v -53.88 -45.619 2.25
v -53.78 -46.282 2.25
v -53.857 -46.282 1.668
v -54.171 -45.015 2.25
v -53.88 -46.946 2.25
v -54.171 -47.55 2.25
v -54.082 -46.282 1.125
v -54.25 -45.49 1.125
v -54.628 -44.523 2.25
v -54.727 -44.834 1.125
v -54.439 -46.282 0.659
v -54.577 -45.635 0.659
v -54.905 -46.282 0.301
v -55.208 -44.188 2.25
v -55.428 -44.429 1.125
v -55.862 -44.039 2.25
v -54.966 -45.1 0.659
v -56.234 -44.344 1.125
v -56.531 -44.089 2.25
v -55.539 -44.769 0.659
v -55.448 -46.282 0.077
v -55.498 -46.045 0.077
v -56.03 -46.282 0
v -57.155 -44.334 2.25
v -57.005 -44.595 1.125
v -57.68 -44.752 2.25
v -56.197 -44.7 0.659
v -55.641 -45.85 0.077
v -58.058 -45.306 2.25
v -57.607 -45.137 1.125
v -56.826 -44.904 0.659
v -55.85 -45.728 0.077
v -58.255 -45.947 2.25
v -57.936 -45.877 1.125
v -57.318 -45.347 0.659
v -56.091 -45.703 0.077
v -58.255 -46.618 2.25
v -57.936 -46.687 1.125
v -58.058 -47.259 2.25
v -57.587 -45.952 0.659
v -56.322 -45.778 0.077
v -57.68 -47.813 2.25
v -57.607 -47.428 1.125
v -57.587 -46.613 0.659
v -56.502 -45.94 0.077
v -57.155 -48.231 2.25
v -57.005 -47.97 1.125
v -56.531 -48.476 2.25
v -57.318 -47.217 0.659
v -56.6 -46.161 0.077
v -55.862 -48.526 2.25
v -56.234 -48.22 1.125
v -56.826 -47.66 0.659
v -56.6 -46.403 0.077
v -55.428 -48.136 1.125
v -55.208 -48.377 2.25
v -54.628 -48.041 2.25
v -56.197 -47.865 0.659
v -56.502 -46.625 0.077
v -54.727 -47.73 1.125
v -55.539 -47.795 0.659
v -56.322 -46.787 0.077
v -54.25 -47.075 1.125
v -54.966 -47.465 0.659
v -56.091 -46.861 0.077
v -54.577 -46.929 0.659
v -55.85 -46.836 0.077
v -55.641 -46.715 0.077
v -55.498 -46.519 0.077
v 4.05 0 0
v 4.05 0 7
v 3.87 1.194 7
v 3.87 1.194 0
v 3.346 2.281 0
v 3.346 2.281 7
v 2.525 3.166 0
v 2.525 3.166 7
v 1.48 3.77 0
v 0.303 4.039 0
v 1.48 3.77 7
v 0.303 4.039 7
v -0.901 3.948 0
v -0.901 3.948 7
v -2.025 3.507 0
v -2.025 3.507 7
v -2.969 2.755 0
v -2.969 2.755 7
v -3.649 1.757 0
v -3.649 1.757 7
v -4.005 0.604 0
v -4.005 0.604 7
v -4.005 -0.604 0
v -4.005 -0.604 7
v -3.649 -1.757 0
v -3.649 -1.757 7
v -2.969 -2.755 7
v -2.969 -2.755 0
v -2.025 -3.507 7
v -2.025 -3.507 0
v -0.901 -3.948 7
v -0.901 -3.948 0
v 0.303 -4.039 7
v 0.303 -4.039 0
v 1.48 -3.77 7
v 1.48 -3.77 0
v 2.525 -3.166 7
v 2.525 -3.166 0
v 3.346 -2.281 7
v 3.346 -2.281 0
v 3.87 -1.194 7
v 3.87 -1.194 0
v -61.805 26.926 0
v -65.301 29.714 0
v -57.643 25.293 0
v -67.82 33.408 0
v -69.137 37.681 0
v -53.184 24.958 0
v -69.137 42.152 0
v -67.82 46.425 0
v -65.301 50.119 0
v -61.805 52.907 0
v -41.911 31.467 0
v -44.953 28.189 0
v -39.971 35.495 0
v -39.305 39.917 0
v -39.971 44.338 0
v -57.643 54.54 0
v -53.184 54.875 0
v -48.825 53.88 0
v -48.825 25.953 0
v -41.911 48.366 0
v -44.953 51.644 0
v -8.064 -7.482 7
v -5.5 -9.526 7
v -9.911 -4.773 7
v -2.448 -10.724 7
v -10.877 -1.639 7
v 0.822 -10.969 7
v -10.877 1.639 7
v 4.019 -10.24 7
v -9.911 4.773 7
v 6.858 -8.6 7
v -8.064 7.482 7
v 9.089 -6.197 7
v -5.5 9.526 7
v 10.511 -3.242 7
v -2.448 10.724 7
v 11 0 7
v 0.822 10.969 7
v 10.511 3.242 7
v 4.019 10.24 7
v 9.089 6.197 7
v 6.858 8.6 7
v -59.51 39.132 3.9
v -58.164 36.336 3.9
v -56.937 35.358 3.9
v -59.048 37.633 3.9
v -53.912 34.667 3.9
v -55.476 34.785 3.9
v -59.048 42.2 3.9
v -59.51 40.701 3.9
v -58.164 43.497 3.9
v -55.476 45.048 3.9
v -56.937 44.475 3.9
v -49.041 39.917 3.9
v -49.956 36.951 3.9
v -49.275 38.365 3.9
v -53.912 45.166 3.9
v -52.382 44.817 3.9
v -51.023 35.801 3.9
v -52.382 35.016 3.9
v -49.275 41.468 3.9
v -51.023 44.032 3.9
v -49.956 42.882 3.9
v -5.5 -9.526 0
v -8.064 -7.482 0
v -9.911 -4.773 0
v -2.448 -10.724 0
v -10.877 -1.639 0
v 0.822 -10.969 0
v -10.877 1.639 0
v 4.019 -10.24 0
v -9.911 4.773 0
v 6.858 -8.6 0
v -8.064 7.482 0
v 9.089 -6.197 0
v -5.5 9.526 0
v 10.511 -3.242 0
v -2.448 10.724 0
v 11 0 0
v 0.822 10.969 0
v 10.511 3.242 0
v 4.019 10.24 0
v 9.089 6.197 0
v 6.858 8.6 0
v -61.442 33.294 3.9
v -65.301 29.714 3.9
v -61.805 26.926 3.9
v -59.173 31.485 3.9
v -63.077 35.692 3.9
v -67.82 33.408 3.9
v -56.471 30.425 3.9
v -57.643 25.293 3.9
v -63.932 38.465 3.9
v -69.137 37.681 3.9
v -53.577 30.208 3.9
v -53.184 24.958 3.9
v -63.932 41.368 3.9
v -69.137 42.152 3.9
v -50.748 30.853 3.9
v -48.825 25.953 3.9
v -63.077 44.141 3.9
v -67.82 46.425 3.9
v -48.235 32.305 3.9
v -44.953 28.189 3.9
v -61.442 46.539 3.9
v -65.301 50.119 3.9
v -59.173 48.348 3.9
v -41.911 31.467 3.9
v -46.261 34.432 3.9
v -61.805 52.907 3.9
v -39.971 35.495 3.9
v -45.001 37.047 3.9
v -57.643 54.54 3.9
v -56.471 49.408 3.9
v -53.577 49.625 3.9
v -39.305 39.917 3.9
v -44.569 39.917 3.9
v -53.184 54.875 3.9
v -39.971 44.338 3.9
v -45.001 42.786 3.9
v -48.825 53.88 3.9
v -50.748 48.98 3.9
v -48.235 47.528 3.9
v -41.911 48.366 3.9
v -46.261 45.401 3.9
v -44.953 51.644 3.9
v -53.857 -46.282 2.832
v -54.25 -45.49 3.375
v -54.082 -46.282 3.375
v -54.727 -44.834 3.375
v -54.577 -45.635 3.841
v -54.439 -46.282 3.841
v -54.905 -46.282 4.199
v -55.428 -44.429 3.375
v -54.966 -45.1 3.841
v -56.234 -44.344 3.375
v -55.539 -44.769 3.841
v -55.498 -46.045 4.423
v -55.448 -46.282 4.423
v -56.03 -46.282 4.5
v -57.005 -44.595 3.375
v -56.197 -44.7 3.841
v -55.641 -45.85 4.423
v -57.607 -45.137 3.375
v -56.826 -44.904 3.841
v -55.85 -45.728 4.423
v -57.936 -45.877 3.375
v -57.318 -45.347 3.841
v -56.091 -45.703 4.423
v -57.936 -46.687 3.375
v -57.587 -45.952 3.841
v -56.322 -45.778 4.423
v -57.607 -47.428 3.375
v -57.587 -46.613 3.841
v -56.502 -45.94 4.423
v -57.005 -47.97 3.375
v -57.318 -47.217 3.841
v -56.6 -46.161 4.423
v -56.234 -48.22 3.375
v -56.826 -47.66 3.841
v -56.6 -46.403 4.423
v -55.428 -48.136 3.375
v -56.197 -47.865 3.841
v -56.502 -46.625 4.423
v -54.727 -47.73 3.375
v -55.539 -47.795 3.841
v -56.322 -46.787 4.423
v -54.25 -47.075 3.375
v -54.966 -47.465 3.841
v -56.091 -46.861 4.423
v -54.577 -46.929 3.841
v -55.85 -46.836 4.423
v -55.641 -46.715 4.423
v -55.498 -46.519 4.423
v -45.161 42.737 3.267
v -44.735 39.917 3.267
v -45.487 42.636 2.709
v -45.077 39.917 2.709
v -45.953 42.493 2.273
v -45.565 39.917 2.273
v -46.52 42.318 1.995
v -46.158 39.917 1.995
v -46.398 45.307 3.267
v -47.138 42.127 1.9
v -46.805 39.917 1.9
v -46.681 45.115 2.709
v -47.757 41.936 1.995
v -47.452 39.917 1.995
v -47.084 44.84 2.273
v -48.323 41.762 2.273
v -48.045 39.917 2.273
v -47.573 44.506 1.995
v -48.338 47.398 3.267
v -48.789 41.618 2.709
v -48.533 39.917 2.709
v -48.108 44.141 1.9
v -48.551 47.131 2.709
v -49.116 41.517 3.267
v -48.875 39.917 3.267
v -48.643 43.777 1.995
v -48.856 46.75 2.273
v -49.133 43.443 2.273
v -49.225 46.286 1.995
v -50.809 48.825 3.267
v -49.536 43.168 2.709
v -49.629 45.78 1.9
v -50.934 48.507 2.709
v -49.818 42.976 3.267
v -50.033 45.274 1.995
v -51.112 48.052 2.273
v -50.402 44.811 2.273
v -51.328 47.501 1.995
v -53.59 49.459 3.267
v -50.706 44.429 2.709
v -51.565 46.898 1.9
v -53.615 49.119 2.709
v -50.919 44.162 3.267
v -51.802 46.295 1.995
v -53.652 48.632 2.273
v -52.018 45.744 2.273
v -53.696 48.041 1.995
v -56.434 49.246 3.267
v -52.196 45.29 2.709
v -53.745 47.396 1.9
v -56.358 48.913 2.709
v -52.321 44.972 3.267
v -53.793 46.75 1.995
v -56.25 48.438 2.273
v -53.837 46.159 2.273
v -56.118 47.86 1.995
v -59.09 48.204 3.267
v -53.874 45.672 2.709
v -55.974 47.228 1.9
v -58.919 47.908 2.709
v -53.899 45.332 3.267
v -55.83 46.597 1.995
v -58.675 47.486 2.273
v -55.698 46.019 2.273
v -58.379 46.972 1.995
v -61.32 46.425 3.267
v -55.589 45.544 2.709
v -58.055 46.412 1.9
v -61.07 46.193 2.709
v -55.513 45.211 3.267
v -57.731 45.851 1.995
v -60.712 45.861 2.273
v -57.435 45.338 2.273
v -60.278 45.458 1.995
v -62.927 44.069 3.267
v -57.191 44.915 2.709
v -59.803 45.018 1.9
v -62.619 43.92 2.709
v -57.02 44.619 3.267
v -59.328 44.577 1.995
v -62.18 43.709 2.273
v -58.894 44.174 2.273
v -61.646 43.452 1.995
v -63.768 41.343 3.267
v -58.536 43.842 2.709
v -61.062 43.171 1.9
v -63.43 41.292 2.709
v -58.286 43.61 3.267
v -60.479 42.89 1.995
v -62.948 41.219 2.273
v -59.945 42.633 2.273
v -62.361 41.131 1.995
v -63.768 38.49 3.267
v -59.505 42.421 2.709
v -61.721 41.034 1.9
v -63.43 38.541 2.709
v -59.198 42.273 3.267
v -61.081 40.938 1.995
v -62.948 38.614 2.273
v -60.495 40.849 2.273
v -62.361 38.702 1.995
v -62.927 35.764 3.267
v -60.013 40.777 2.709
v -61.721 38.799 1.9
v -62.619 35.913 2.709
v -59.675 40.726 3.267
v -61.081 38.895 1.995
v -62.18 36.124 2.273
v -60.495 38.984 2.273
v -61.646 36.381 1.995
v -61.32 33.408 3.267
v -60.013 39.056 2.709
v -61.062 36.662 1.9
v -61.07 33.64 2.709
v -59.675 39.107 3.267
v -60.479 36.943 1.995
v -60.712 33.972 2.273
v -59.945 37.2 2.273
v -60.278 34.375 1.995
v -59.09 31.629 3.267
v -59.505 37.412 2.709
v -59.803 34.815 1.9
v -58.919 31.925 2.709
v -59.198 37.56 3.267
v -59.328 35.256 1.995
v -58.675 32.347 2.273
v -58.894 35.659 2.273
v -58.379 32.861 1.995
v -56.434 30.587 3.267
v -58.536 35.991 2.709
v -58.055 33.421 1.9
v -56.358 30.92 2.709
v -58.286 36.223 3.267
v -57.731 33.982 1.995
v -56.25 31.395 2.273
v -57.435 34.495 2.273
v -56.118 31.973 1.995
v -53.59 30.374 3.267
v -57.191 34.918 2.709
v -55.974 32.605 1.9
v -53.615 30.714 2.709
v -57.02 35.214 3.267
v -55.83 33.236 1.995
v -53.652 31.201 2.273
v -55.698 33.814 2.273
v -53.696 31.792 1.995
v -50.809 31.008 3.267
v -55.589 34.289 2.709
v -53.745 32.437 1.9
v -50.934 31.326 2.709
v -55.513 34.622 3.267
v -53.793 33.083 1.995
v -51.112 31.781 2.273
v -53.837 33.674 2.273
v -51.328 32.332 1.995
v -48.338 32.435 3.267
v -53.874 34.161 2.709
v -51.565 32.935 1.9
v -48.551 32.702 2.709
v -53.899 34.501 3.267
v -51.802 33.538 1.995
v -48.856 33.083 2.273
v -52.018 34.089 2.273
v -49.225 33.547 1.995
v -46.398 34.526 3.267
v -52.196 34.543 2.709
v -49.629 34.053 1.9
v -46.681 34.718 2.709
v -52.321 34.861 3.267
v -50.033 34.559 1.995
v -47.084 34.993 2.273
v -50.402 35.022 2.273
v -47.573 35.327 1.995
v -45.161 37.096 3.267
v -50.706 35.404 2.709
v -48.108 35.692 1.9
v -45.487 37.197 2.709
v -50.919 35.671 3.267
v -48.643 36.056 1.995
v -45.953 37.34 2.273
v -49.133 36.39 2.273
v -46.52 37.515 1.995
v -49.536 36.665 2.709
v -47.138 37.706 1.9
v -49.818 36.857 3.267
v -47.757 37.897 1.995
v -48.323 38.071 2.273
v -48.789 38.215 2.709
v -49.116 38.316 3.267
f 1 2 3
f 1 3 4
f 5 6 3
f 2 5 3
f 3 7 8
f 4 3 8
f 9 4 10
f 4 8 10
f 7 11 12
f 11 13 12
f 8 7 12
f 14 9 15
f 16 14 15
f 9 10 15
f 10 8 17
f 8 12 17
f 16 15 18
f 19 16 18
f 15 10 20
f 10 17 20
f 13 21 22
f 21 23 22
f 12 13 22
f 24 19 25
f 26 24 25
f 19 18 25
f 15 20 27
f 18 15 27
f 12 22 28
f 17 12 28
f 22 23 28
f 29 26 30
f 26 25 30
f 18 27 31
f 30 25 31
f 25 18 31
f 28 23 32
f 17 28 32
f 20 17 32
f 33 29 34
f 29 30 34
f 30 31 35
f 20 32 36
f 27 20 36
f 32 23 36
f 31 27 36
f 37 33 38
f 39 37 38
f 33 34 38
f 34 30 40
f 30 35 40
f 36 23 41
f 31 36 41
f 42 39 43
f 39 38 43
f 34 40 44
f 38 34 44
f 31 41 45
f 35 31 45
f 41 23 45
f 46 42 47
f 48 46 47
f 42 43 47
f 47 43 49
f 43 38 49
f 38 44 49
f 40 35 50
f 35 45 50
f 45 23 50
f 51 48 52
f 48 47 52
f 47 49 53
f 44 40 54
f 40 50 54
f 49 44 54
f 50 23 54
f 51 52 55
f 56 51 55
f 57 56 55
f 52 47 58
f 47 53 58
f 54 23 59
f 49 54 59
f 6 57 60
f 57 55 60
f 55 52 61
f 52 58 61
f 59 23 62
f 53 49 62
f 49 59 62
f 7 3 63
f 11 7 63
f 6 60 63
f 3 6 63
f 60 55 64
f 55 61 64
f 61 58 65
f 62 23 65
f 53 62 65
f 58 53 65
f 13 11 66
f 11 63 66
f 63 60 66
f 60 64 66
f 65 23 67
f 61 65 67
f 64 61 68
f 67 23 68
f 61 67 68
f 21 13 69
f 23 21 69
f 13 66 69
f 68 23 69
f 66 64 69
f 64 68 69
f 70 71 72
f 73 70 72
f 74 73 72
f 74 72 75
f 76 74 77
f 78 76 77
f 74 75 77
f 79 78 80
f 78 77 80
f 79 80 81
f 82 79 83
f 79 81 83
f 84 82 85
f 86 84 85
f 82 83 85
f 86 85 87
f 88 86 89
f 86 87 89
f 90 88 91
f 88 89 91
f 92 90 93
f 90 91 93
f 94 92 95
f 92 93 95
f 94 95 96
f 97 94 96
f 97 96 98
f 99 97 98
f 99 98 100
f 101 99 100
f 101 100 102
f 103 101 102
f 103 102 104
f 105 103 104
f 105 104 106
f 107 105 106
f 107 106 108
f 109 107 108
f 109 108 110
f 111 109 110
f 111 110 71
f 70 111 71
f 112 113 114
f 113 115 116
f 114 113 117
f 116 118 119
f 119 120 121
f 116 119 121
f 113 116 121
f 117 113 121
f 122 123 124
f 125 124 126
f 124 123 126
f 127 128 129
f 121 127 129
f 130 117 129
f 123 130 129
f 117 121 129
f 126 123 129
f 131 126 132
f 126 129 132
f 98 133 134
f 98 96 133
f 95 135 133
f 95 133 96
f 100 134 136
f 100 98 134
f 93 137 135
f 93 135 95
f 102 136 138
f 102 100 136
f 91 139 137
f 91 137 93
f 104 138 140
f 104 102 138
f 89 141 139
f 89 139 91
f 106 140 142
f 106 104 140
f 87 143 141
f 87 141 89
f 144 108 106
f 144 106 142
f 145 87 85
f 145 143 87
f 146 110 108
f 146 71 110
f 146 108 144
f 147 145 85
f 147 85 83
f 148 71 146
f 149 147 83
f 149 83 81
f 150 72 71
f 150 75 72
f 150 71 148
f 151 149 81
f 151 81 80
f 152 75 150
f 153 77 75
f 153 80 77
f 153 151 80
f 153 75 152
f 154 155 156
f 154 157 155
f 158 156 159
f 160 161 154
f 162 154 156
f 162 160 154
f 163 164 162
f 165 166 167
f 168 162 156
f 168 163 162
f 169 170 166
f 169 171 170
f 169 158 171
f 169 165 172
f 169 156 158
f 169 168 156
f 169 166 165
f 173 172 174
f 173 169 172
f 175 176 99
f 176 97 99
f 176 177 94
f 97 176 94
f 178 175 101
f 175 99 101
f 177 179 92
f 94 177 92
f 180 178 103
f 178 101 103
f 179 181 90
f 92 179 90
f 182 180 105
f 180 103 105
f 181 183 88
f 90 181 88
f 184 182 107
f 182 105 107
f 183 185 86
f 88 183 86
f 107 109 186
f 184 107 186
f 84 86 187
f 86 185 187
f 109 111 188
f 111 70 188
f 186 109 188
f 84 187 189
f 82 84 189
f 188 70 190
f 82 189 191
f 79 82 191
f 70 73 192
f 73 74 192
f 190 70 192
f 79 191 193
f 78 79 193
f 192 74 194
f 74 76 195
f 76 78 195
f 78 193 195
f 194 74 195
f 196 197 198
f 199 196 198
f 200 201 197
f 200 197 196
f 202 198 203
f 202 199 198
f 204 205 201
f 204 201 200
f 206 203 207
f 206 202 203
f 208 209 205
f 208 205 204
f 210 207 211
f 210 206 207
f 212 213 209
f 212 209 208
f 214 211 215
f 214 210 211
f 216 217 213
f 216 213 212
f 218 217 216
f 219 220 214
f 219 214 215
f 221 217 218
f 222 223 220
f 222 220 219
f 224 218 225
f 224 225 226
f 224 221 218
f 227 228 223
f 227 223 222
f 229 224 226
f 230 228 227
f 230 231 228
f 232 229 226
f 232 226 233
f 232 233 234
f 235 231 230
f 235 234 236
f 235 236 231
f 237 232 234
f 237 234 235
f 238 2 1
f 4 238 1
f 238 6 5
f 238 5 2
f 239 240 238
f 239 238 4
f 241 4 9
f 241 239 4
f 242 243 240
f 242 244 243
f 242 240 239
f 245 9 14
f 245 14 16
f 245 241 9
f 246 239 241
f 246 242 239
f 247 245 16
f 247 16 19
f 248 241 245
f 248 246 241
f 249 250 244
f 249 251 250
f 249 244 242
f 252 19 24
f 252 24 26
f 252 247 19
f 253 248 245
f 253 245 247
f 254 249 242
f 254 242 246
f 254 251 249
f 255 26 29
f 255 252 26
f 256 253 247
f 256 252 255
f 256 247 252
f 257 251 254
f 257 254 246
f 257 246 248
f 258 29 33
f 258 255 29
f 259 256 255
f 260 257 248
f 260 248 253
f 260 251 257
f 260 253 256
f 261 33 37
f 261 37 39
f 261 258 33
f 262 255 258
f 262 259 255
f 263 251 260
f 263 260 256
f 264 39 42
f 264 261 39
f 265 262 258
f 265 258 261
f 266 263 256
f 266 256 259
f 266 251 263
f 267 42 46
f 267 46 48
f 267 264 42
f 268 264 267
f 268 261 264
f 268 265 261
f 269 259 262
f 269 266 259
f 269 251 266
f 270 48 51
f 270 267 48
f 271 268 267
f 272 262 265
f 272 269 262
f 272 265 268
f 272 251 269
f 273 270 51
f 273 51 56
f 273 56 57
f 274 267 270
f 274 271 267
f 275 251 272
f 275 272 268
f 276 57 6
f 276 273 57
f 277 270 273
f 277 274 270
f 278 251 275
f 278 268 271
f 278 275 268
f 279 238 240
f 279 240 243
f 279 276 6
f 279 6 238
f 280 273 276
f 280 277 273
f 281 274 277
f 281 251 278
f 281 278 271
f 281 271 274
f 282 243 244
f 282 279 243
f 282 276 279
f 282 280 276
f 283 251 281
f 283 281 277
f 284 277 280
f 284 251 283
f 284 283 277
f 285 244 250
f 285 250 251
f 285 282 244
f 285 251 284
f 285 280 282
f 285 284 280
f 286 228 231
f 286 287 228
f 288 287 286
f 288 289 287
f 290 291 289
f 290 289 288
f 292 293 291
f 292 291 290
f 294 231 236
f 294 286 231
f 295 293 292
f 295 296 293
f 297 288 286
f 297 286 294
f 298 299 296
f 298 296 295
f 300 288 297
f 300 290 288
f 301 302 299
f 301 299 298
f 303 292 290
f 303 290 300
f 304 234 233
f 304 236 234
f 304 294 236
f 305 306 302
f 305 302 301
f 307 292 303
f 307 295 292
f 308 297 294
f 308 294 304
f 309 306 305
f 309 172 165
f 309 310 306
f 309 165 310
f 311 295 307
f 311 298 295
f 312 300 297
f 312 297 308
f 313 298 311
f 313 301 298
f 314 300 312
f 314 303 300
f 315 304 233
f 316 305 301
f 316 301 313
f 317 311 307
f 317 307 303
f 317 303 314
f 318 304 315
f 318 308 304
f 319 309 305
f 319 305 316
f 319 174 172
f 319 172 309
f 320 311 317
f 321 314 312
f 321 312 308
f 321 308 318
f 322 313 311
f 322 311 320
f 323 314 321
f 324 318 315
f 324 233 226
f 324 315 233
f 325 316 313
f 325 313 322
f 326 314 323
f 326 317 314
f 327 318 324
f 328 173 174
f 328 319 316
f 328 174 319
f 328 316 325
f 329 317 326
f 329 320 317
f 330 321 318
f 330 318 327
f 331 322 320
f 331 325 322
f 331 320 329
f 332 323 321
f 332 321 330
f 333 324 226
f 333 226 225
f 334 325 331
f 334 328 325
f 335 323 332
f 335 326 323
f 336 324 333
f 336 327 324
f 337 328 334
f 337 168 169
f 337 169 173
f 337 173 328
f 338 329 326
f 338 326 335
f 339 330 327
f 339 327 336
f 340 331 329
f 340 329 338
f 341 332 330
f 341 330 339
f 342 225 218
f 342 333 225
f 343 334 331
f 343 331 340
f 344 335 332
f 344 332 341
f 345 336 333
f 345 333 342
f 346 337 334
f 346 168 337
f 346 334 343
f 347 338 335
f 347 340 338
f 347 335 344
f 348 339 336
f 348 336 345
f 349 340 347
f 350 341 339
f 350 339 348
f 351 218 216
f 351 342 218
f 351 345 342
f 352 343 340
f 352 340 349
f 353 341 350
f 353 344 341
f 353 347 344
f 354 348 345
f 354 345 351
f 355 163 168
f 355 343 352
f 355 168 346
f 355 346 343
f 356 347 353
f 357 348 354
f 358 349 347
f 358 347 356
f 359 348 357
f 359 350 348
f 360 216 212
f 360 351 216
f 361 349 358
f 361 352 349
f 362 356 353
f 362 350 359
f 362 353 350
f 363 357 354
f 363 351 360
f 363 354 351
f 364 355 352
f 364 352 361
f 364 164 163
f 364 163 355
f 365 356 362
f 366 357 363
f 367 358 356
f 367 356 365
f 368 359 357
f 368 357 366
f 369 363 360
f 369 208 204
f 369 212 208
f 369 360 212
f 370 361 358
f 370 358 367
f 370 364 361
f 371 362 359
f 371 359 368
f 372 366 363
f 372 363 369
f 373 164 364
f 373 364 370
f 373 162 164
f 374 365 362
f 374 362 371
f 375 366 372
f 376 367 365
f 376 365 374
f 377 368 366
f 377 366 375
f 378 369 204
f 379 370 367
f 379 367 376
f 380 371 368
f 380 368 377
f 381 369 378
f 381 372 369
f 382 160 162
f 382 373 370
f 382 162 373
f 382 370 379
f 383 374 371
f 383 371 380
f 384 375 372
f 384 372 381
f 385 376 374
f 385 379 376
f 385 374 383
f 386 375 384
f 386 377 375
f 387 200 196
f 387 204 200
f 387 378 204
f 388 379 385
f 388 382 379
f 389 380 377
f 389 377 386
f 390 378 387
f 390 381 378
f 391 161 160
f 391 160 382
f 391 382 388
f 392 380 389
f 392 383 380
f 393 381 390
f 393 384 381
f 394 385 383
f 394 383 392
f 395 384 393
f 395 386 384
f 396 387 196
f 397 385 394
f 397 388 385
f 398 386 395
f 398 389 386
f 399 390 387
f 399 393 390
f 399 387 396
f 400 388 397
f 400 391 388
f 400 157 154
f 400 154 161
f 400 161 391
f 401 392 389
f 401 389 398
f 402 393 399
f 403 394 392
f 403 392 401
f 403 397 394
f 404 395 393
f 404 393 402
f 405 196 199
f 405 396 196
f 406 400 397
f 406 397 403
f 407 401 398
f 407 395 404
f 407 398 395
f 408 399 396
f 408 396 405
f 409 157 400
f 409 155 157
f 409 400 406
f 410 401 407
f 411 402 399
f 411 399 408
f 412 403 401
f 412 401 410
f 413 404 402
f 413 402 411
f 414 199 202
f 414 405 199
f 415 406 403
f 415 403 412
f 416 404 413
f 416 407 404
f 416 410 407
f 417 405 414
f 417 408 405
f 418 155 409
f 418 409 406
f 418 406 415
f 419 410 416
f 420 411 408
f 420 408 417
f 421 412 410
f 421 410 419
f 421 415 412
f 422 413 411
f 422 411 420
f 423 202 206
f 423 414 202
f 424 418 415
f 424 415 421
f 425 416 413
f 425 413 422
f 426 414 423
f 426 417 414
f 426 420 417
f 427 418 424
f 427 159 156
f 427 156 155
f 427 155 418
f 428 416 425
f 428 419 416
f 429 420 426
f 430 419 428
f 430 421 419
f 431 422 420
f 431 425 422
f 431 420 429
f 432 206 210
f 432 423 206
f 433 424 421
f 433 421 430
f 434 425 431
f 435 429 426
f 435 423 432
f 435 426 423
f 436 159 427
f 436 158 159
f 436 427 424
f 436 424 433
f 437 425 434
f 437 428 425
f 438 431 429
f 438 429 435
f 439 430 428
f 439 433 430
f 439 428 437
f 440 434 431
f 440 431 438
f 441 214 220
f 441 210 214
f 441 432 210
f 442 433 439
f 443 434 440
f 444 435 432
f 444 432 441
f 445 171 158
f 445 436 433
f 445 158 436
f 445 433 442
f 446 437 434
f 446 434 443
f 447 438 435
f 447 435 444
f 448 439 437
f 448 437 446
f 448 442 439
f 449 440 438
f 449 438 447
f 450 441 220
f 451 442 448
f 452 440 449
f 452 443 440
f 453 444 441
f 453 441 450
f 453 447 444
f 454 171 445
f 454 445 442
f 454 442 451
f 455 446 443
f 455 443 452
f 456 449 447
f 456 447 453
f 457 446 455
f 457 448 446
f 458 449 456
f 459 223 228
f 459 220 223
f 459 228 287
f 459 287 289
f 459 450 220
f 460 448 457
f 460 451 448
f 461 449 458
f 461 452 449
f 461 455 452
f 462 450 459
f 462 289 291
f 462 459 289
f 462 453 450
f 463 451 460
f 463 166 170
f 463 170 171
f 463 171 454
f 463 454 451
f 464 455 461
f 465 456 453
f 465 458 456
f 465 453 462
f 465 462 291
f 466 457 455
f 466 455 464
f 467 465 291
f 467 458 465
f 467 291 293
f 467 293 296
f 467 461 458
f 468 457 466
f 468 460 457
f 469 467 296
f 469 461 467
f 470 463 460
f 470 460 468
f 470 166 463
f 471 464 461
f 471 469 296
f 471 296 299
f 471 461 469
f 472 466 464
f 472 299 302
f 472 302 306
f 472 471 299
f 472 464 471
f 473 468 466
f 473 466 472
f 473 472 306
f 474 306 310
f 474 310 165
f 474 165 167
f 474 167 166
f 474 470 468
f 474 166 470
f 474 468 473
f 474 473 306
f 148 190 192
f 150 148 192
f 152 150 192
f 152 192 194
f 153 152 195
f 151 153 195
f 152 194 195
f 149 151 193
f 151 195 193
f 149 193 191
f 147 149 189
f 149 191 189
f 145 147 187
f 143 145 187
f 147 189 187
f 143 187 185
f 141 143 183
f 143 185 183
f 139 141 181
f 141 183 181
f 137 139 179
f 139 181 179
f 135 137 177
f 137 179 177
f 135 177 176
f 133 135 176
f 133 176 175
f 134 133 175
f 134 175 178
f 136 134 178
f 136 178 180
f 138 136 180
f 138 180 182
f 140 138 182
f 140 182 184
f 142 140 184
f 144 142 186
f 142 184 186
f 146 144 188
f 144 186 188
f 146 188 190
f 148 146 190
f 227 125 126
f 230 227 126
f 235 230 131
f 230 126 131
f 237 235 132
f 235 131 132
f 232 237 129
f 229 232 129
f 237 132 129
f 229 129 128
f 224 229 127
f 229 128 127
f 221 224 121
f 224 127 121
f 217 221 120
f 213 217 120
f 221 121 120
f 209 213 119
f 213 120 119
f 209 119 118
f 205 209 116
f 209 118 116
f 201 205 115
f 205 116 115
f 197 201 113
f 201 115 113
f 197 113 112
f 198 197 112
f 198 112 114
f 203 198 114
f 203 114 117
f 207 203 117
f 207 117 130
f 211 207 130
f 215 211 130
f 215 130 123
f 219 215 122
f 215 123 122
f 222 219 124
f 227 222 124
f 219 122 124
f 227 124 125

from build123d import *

# Parameters (mm, degrees)
F0_R      = 11
F0_R_2    = 2.5
F1_DEPTH  = 7
F2_R      = 2.25
F3_DEPTH  = 4.5
F4_R      = 2.24999
F5_R      = 15
F6_DEPTH  = 3.9
F11_R     = 4.05
F12_DEPTH = 25


# Not quite as in the source:
# - a fillet or chamfer is up to 0.001 mm smaller than in the source, because OpenCascade refuses the exact size


with BuildPart() as f1:
    # F0 (on Top) → F1 (new body)
    with BuildSketch(Plane.XY):
        Circle(F0_R)
        Circle(F0_R_2, mode=Mode.SUBTRACT)
    extrude(amount=F1_DEPTH)

    # F11 (on face) → F12 (cut)
    with BuildSketch(Plane.XY.offset(7)):
        Circle(F11_R)
    extrude(amount=-F12_DEPTH, mode=Mode.SUBTRACT)


with BuildPart() as f3:
    # F2 (on Top) → F3 (new body)
    with BuildSketch(Plane.XY):
        with Locations((-56.030407548, -46.2823361158)):
            Circle(F2_R)
    extrude(amount=F3_DEPTH)

    # F4 (radius 2.25 in the source; OpenCascade refuses exactly that, so slightly less here)
    f4_edges = [f3.edges().sort_by_distance(p)[0] for p in [
        (-58.280408, -46.282336, 4.5),
        (-58.280408, -46.282336, 0),
    ]]
    fillet(f4_edges, radius=F4_R)


with BuildPart() as f6:
    # F5 (on Top) → F6 (new body)
    with BuildSketch(Plane.XY):
        with Locations((-54.3050132692, 39.9165041745)):
            Circle(F5_R)
    extrude(amount=F6_DEPTH)

    # F9 (on line) → F10 (revolve, cut)
    with BuildSketch(Plane(origin=(0, 39.9165041745, 0), x_dir=(-1, 0, 0), z_dir=(0, 1, 0))):
        with BuildLine():
            Line((49.0550132692, 4.15), (44.5550132692, 4.15))
            ThreePointArc((44.5550132692, 4.15), (46.8050132692, 1.9), (49.0550132692, 4.15))
        make_face()
    revolve(axis=Axis((-54.3050132692, 39.9165041745, 3.9), (0, 0, 1)), mode=Mode.SUBTRACT)


solid = Compound([f1.part, f3.part, f6.part])
